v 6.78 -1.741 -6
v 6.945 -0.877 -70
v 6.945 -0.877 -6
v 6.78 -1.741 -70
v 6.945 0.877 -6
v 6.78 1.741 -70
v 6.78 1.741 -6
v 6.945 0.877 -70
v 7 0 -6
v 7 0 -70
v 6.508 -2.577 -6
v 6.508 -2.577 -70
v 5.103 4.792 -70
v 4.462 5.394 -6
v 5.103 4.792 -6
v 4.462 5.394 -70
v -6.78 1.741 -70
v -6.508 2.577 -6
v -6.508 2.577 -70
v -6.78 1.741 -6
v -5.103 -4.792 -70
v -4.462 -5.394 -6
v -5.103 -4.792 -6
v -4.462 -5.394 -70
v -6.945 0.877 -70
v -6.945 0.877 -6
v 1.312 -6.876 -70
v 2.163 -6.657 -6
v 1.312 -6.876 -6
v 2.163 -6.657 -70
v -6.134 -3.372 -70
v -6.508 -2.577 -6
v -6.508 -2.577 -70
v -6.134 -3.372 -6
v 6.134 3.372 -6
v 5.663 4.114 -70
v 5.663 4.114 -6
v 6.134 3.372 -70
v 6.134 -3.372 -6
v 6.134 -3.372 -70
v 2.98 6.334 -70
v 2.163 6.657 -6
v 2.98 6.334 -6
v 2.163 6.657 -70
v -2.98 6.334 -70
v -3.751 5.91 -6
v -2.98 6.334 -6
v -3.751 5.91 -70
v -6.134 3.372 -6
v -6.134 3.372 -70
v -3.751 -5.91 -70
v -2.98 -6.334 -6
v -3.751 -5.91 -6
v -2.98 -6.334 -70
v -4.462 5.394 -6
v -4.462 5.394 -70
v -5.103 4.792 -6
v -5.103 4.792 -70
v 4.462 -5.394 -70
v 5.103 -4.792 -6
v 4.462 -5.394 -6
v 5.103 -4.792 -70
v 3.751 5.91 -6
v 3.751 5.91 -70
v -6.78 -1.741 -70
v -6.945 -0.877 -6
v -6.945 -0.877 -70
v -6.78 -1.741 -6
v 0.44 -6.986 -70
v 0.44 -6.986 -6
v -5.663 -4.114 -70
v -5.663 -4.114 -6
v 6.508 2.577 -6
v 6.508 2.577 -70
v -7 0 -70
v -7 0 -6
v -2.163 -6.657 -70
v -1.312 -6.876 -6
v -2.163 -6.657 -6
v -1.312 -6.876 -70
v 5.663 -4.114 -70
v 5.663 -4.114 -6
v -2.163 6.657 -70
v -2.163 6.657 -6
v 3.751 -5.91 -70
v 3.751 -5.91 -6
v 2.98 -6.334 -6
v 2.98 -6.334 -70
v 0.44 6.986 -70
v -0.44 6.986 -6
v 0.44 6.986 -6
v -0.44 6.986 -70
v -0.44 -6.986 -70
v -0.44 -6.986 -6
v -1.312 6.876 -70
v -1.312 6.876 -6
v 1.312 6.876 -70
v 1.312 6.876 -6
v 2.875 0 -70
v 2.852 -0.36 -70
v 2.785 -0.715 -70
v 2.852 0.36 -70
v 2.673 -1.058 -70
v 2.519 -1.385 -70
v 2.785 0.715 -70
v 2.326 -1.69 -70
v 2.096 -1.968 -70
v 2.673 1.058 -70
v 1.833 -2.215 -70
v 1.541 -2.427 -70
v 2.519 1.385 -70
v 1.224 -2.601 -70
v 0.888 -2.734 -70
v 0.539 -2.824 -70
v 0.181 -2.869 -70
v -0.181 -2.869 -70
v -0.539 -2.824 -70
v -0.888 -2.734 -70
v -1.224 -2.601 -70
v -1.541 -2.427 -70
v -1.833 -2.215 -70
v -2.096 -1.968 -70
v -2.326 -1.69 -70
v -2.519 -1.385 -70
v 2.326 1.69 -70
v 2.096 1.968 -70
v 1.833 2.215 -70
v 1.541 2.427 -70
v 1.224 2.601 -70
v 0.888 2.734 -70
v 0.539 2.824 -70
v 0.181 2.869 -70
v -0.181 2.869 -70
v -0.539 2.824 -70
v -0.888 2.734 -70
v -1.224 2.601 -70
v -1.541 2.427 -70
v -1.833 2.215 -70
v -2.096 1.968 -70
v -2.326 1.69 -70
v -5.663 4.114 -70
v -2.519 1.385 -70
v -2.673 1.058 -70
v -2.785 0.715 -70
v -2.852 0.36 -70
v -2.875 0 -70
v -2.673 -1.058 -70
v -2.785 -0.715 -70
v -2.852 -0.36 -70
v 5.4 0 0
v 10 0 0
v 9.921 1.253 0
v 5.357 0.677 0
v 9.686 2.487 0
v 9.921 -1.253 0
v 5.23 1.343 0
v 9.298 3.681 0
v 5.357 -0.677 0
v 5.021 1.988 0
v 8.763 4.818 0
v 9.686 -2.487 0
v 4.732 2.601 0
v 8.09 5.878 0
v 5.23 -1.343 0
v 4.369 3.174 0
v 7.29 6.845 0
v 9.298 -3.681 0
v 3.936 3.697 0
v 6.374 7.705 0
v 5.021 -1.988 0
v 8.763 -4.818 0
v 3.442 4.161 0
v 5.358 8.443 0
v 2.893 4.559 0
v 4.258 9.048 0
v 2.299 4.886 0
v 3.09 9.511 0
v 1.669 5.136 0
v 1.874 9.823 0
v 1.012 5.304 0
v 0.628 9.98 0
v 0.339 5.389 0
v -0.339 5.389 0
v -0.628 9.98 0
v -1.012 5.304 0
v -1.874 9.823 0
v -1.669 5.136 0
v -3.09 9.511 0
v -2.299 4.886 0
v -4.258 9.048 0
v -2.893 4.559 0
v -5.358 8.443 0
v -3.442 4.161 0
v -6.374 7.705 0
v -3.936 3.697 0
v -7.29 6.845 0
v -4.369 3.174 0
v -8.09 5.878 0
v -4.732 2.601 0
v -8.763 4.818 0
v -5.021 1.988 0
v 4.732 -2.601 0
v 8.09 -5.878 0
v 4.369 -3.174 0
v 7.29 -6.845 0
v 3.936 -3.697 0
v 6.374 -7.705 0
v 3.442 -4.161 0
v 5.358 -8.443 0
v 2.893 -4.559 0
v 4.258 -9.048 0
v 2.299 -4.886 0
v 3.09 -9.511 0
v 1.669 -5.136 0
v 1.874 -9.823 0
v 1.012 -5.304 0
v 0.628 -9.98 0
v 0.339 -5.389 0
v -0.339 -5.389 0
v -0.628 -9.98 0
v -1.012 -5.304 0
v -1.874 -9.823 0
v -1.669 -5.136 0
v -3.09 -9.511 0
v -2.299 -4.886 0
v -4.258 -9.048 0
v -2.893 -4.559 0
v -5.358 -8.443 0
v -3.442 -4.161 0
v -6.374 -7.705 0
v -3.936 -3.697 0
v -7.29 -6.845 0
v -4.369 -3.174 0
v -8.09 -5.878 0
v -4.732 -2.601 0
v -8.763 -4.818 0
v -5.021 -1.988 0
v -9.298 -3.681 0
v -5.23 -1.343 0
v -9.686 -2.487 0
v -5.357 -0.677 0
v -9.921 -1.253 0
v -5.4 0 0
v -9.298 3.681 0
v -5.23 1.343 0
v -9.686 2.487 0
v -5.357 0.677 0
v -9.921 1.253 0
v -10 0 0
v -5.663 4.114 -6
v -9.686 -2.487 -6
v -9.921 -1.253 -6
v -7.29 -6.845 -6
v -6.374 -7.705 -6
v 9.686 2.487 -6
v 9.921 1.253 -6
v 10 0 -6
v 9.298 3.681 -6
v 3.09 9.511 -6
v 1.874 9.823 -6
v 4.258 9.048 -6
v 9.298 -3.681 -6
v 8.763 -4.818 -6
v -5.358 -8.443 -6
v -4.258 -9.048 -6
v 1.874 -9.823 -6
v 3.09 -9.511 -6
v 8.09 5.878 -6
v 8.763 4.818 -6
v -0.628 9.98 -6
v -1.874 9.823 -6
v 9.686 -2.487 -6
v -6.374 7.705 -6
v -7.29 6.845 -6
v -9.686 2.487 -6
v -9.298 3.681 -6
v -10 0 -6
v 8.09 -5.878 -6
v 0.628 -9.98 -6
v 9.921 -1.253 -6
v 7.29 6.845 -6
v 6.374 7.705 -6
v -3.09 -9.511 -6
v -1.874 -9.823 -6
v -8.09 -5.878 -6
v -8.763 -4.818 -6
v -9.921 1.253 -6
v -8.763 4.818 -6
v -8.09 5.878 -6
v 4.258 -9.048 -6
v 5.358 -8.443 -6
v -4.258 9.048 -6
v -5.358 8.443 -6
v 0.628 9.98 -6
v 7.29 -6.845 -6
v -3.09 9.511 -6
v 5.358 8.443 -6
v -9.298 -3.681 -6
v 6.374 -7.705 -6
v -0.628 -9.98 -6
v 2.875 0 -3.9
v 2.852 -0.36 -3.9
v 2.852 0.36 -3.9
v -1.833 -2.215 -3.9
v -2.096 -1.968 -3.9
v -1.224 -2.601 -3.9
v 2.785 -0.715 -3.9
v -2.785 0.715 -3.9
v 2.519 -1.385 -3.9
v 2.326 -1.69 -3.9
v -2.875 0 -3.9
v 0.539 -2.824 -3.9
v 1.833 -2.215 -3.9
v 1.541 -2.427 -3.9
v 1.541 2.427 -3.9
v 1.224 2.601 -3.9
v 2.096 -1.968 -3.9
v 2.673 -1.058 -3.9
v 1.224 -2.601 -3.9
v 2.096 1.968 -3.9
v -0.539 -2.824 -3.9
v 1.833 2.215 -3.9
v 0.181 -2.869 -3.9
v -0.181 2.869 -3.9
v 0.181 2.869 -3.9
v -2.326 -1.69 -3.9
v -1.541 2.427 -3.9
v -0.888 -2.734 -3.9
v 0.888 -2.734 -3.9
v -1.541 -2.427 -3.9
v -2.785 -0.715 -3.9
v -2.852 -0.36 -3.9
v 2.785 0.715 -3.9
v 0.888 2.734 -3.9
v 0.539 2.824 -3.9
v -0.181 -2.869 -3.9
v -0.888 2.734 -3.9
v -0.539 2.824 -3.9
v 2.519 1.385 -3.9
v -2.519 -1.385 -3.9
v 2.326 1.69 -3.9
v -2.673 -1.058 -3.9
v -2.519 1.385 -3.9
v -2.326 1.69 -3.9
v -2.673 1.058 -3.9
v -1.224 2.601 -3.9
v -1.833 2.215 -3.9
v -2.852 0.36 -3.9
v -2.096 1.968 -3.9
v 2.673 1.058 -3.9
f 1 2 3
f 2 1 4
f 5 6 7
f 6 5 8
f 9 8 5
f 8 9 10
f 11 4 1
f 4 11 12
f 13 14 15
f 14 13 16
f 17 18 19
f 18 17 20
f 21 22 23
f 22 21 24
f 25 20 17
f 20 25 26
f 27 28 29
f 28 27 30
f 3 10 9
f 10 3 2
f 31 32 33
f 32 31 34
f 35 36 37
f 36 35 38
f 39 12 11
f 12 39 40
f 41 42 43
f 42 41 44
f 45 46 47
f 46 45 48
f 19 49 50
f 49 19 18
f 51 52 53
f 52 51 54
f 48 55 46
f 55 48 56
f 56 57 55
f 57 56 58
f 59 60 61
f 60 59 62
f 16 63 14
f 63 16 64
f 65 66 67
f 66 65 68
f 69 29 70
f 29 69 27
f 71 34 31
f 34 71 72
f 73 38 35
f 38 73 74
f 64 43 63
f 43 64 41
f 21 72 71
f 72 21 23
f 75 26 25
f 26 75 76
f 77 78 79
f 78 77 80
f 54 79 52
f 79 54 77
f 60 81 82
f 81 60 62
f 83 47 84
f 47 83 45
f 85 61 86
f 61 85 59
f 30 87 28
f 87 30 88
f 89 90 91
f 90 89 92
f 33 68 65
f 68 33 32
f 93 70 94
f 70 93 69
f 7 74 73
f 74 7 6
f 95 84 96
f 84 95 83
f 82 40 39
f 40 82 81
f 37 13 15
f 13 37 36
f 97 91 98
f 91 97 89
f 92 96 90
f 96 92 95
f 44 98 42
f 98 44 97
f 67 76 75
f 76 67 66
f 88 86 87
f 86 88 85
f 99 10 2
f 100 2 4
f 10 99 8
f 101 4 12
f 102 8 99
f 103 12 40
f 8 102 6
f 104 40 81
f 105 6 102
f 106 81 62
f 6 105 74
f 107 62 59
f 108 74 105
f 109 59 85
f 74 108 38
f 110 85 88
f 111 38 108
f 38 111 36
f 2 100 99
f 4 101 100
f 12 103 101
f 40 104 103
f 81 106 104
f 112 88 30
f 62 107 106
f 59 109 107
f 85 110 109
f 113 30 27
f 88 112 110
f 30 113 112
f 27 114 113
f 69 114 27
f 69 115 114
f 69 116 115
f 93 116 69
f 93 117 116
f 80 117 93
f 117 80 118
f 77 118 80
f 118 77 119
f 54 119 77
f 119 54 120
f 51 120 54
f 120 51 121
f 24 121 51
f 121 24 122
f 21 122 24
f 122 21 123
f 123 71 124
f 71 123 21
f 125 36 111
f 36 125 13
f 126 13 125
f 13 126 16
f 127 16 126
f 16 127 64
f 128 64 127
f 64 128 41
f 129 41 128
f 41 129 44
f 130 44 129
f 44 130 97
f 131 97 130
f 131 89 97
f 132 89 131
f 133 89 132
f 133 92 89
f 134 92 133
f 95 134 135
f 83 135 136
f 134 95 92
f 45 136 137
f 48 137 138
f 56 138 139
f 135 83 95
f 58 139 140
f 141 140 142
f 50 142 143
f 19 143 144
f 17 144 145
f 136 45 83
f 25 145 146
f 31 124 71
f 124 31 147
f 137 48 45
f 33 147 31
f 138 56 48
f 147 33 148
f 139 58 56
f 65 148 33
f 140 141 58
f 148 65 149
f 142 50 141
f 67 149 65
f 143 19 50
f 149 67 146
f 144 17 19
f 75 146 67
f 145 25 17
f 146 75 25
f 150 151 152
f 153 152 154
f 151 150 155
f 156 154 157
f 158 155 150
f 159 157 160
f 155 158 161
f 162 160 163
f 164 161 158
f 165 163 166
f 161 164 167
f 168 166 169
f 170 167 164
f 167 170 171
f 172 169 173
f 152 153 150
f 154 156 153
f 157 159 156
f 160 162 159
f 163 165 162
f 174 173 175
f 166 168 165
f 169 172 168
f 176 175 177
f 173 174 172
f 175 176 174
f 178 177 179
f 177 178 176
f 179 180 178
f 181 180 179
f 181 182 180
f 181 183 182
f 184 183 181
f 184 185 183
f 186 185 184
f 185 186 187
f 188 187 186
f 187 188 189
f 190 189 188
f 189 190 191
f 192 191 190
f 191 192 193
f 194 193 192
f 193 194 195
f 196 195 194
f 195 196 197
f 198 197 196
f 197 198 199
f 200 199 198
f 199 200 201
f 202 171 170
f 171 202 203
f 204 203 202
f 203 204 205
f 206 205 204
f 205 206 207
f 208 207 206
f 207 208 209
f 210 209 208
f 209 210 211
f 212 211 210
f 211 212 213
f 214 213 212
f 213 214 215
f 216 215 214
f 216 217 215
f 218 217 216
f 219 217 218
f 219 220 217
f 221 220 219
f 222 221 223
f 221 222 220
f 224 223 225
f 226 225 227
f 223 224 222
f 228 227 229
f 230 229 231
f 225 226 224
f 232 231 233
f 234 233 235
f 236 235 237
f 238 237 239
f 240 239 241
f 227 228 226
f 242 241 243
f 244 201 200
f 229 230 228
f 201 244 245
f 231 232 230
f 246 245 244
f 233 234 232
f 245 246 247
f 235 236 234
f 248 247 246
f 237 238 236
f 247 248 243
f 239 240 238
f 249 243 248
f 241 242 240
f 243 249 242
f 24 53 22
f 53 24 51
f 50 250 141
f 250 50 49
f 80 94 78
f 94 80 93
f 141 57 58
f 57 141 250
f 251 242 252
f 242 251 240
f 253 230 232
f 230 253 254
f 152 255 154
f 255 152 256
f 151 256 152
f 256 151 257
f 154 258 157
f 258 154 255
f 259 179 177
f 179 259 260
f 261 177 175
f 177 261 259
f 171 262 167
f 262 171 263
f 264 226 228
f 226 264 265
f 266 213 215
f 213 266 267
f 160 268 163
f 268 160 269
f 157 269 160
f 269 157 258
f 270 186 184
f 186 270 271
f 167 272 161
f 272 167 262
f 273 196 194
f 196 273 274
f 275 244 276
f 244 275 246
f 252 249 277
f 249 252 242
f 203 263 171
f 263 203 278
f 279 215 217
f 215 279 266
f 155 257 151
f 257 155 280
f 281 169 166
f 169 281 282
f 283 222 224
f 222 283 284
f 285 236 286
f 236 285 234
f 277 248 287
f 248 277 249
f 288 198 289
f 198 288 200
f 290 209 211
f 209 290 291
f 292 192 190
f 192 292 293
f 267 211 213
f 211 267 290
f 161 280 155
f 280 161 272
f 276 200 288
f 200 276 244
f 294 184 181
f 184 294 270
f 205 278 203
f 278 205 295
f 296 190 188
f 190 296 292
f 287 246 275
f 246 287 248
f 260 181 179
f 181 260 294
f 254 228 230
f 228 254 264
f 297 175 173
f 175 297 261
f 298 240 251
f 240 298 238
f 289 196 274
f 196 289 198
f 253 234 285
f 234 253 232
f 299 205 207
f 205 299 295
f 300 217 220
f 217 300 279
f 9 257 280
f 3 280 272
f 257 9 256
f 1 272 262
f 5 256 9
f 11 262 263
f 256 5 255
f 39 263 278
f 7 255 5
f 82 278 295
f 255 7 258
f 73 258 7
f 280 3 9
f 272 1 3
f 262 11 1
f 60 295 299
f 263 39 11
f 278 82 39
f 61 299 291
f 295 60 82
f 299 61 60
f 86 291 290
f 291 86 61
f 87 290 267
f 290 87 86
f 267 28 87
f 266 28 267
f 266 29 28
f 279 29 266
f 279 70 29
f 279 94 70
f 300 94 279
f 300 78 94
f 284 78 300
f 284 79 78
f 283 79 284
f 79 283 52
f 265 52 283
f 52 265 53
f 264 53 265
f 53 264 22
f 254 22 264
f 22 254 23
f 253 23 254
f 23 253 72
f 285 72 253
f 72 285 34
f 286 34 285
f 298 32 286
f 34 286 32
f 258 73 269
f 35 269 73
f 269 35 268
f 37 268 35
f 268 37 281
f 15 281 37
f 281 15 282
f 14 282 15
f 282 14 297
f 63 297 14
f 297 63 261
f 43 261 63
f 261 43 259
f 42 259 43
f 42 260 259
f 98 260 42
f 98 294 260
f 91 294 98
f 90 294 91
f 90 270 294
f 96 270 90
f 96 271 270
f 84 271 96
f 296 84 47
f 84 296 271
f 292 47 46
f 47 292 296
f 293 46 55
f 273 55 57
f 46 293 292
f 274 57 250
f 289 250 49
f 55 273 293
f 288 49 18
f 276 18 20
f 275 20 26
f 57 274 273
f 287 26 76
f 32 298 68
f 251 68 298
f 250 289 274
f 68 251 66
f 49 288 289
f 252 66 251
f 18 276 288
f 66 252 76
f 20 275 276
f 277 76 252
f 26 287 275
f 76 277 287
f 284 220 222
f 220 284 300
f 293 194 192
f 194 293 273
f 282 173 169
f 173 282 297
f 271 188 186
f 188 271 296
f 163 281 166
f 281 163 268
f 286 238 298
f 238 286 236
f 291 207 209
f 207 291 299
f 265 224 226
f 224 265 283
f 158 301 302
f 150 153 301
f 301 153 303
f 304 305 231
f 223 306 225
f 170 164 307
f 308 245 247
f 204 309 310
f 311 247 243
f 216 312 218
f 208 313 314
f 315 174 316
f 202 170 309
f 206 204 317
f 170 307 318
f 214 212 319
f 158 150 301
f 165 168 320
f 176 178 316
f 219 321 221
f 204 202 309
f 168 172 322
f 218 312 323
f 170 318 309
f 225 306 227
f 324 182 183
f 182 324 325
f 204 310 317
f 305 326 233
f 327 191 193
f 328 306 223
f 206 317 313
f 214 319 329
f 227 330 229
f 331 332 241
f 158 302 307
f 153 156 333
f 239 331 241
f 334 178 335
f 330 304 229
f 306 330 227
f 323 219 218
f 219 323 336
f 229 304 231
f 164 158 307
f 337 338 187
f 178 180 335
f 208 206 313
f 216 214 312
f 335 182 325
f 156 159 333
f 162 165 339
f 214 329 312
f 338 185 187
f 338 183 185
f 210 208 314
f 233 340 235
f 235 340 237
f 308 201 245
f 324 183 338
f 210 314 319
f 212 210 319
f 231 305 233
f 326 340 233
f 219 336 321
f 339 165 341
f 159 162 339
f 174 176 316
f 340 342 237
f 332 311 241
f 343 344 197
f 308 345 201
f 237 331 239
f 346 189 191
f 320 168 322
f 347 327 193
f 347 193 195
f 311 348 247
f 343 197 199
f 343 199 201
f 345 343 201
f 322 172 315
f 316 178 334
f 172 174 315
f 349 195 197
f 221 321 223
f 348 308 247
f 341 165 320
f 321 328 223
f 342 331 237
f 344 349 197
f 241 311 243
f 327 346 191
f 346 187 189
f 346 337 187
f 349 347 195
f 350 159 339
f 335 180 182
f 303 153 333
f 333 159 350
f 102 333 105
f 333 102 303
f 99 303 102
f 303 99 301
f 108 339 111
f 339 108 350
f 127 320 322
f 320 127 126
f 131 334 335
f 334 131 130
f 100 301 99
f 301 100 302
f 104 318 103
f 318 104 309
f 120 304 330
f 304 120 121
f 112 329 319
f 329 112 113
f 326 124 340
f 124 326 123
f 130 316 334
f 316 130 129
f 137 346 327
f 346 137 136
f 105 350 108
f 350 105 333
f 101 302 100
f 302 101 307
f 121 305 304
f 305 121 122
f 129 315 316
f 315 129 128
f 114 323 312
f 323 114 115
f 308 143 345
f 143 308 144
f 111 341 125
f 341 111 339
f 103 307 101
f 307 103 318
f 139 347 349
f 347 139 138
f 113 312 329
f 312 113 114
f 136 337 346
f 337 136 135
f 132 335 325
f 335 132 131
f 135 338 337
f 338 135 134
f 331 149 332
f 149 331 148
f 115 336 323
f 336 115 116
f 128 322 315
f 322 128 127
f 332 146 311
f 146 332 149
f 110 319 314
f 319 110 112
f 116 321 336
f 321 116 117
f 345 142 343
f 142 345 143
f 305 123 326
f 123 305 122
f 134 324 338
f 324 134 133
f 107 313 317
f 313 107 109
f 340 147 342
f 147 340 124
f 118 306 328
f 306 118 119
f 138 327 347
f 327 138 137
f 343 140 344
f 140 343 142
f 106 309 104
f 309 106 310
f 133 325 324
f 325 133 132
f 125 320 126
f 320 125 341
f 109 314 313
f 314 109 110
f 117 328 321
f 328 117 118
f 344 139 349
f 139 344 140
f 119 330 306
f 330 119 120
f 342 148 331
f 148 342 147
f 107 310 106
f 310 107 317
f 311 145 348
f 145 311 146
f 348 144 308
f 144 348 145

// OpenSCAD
$fn = 50;


difference() {
	union() {
		translate(v = [0, 0, -70.0000000000]) {
			cylinder(h = 70, r = 7.0000000000);
		}
		translate(v = [0, 0, -6.0000000000]) {
			cylinder(h = 6, r = 10.0000000000);
		}
	}
	union() {
		translate(v = [0, 0, 0]) {
			rotate(a = [0, 0, 0]) {
				difference() {
					union() {
						#translate(v = [0, 0, -70.0000000000]) {
							cylinder(h = 70, r = 2.6000000000);
						}
						#translate(v = [0, 0, -3.9000000000]) {
							cylinder(h = 3.9000000000, r = 7.0000000000, r1 = 2.8750000000, r2 = 5.4000000000);
						}
						#translate(v = [0, 0, -70.0000000000]) {
							cylinder(h = 70, r = 2.8750000000);
						}
						#translate(v = [0, 0, -70.0000000000]) {
							cylinder(h = 70, r = 2.6000000000);
						}
					}
					union();
				}
			}
		}
	}
}
